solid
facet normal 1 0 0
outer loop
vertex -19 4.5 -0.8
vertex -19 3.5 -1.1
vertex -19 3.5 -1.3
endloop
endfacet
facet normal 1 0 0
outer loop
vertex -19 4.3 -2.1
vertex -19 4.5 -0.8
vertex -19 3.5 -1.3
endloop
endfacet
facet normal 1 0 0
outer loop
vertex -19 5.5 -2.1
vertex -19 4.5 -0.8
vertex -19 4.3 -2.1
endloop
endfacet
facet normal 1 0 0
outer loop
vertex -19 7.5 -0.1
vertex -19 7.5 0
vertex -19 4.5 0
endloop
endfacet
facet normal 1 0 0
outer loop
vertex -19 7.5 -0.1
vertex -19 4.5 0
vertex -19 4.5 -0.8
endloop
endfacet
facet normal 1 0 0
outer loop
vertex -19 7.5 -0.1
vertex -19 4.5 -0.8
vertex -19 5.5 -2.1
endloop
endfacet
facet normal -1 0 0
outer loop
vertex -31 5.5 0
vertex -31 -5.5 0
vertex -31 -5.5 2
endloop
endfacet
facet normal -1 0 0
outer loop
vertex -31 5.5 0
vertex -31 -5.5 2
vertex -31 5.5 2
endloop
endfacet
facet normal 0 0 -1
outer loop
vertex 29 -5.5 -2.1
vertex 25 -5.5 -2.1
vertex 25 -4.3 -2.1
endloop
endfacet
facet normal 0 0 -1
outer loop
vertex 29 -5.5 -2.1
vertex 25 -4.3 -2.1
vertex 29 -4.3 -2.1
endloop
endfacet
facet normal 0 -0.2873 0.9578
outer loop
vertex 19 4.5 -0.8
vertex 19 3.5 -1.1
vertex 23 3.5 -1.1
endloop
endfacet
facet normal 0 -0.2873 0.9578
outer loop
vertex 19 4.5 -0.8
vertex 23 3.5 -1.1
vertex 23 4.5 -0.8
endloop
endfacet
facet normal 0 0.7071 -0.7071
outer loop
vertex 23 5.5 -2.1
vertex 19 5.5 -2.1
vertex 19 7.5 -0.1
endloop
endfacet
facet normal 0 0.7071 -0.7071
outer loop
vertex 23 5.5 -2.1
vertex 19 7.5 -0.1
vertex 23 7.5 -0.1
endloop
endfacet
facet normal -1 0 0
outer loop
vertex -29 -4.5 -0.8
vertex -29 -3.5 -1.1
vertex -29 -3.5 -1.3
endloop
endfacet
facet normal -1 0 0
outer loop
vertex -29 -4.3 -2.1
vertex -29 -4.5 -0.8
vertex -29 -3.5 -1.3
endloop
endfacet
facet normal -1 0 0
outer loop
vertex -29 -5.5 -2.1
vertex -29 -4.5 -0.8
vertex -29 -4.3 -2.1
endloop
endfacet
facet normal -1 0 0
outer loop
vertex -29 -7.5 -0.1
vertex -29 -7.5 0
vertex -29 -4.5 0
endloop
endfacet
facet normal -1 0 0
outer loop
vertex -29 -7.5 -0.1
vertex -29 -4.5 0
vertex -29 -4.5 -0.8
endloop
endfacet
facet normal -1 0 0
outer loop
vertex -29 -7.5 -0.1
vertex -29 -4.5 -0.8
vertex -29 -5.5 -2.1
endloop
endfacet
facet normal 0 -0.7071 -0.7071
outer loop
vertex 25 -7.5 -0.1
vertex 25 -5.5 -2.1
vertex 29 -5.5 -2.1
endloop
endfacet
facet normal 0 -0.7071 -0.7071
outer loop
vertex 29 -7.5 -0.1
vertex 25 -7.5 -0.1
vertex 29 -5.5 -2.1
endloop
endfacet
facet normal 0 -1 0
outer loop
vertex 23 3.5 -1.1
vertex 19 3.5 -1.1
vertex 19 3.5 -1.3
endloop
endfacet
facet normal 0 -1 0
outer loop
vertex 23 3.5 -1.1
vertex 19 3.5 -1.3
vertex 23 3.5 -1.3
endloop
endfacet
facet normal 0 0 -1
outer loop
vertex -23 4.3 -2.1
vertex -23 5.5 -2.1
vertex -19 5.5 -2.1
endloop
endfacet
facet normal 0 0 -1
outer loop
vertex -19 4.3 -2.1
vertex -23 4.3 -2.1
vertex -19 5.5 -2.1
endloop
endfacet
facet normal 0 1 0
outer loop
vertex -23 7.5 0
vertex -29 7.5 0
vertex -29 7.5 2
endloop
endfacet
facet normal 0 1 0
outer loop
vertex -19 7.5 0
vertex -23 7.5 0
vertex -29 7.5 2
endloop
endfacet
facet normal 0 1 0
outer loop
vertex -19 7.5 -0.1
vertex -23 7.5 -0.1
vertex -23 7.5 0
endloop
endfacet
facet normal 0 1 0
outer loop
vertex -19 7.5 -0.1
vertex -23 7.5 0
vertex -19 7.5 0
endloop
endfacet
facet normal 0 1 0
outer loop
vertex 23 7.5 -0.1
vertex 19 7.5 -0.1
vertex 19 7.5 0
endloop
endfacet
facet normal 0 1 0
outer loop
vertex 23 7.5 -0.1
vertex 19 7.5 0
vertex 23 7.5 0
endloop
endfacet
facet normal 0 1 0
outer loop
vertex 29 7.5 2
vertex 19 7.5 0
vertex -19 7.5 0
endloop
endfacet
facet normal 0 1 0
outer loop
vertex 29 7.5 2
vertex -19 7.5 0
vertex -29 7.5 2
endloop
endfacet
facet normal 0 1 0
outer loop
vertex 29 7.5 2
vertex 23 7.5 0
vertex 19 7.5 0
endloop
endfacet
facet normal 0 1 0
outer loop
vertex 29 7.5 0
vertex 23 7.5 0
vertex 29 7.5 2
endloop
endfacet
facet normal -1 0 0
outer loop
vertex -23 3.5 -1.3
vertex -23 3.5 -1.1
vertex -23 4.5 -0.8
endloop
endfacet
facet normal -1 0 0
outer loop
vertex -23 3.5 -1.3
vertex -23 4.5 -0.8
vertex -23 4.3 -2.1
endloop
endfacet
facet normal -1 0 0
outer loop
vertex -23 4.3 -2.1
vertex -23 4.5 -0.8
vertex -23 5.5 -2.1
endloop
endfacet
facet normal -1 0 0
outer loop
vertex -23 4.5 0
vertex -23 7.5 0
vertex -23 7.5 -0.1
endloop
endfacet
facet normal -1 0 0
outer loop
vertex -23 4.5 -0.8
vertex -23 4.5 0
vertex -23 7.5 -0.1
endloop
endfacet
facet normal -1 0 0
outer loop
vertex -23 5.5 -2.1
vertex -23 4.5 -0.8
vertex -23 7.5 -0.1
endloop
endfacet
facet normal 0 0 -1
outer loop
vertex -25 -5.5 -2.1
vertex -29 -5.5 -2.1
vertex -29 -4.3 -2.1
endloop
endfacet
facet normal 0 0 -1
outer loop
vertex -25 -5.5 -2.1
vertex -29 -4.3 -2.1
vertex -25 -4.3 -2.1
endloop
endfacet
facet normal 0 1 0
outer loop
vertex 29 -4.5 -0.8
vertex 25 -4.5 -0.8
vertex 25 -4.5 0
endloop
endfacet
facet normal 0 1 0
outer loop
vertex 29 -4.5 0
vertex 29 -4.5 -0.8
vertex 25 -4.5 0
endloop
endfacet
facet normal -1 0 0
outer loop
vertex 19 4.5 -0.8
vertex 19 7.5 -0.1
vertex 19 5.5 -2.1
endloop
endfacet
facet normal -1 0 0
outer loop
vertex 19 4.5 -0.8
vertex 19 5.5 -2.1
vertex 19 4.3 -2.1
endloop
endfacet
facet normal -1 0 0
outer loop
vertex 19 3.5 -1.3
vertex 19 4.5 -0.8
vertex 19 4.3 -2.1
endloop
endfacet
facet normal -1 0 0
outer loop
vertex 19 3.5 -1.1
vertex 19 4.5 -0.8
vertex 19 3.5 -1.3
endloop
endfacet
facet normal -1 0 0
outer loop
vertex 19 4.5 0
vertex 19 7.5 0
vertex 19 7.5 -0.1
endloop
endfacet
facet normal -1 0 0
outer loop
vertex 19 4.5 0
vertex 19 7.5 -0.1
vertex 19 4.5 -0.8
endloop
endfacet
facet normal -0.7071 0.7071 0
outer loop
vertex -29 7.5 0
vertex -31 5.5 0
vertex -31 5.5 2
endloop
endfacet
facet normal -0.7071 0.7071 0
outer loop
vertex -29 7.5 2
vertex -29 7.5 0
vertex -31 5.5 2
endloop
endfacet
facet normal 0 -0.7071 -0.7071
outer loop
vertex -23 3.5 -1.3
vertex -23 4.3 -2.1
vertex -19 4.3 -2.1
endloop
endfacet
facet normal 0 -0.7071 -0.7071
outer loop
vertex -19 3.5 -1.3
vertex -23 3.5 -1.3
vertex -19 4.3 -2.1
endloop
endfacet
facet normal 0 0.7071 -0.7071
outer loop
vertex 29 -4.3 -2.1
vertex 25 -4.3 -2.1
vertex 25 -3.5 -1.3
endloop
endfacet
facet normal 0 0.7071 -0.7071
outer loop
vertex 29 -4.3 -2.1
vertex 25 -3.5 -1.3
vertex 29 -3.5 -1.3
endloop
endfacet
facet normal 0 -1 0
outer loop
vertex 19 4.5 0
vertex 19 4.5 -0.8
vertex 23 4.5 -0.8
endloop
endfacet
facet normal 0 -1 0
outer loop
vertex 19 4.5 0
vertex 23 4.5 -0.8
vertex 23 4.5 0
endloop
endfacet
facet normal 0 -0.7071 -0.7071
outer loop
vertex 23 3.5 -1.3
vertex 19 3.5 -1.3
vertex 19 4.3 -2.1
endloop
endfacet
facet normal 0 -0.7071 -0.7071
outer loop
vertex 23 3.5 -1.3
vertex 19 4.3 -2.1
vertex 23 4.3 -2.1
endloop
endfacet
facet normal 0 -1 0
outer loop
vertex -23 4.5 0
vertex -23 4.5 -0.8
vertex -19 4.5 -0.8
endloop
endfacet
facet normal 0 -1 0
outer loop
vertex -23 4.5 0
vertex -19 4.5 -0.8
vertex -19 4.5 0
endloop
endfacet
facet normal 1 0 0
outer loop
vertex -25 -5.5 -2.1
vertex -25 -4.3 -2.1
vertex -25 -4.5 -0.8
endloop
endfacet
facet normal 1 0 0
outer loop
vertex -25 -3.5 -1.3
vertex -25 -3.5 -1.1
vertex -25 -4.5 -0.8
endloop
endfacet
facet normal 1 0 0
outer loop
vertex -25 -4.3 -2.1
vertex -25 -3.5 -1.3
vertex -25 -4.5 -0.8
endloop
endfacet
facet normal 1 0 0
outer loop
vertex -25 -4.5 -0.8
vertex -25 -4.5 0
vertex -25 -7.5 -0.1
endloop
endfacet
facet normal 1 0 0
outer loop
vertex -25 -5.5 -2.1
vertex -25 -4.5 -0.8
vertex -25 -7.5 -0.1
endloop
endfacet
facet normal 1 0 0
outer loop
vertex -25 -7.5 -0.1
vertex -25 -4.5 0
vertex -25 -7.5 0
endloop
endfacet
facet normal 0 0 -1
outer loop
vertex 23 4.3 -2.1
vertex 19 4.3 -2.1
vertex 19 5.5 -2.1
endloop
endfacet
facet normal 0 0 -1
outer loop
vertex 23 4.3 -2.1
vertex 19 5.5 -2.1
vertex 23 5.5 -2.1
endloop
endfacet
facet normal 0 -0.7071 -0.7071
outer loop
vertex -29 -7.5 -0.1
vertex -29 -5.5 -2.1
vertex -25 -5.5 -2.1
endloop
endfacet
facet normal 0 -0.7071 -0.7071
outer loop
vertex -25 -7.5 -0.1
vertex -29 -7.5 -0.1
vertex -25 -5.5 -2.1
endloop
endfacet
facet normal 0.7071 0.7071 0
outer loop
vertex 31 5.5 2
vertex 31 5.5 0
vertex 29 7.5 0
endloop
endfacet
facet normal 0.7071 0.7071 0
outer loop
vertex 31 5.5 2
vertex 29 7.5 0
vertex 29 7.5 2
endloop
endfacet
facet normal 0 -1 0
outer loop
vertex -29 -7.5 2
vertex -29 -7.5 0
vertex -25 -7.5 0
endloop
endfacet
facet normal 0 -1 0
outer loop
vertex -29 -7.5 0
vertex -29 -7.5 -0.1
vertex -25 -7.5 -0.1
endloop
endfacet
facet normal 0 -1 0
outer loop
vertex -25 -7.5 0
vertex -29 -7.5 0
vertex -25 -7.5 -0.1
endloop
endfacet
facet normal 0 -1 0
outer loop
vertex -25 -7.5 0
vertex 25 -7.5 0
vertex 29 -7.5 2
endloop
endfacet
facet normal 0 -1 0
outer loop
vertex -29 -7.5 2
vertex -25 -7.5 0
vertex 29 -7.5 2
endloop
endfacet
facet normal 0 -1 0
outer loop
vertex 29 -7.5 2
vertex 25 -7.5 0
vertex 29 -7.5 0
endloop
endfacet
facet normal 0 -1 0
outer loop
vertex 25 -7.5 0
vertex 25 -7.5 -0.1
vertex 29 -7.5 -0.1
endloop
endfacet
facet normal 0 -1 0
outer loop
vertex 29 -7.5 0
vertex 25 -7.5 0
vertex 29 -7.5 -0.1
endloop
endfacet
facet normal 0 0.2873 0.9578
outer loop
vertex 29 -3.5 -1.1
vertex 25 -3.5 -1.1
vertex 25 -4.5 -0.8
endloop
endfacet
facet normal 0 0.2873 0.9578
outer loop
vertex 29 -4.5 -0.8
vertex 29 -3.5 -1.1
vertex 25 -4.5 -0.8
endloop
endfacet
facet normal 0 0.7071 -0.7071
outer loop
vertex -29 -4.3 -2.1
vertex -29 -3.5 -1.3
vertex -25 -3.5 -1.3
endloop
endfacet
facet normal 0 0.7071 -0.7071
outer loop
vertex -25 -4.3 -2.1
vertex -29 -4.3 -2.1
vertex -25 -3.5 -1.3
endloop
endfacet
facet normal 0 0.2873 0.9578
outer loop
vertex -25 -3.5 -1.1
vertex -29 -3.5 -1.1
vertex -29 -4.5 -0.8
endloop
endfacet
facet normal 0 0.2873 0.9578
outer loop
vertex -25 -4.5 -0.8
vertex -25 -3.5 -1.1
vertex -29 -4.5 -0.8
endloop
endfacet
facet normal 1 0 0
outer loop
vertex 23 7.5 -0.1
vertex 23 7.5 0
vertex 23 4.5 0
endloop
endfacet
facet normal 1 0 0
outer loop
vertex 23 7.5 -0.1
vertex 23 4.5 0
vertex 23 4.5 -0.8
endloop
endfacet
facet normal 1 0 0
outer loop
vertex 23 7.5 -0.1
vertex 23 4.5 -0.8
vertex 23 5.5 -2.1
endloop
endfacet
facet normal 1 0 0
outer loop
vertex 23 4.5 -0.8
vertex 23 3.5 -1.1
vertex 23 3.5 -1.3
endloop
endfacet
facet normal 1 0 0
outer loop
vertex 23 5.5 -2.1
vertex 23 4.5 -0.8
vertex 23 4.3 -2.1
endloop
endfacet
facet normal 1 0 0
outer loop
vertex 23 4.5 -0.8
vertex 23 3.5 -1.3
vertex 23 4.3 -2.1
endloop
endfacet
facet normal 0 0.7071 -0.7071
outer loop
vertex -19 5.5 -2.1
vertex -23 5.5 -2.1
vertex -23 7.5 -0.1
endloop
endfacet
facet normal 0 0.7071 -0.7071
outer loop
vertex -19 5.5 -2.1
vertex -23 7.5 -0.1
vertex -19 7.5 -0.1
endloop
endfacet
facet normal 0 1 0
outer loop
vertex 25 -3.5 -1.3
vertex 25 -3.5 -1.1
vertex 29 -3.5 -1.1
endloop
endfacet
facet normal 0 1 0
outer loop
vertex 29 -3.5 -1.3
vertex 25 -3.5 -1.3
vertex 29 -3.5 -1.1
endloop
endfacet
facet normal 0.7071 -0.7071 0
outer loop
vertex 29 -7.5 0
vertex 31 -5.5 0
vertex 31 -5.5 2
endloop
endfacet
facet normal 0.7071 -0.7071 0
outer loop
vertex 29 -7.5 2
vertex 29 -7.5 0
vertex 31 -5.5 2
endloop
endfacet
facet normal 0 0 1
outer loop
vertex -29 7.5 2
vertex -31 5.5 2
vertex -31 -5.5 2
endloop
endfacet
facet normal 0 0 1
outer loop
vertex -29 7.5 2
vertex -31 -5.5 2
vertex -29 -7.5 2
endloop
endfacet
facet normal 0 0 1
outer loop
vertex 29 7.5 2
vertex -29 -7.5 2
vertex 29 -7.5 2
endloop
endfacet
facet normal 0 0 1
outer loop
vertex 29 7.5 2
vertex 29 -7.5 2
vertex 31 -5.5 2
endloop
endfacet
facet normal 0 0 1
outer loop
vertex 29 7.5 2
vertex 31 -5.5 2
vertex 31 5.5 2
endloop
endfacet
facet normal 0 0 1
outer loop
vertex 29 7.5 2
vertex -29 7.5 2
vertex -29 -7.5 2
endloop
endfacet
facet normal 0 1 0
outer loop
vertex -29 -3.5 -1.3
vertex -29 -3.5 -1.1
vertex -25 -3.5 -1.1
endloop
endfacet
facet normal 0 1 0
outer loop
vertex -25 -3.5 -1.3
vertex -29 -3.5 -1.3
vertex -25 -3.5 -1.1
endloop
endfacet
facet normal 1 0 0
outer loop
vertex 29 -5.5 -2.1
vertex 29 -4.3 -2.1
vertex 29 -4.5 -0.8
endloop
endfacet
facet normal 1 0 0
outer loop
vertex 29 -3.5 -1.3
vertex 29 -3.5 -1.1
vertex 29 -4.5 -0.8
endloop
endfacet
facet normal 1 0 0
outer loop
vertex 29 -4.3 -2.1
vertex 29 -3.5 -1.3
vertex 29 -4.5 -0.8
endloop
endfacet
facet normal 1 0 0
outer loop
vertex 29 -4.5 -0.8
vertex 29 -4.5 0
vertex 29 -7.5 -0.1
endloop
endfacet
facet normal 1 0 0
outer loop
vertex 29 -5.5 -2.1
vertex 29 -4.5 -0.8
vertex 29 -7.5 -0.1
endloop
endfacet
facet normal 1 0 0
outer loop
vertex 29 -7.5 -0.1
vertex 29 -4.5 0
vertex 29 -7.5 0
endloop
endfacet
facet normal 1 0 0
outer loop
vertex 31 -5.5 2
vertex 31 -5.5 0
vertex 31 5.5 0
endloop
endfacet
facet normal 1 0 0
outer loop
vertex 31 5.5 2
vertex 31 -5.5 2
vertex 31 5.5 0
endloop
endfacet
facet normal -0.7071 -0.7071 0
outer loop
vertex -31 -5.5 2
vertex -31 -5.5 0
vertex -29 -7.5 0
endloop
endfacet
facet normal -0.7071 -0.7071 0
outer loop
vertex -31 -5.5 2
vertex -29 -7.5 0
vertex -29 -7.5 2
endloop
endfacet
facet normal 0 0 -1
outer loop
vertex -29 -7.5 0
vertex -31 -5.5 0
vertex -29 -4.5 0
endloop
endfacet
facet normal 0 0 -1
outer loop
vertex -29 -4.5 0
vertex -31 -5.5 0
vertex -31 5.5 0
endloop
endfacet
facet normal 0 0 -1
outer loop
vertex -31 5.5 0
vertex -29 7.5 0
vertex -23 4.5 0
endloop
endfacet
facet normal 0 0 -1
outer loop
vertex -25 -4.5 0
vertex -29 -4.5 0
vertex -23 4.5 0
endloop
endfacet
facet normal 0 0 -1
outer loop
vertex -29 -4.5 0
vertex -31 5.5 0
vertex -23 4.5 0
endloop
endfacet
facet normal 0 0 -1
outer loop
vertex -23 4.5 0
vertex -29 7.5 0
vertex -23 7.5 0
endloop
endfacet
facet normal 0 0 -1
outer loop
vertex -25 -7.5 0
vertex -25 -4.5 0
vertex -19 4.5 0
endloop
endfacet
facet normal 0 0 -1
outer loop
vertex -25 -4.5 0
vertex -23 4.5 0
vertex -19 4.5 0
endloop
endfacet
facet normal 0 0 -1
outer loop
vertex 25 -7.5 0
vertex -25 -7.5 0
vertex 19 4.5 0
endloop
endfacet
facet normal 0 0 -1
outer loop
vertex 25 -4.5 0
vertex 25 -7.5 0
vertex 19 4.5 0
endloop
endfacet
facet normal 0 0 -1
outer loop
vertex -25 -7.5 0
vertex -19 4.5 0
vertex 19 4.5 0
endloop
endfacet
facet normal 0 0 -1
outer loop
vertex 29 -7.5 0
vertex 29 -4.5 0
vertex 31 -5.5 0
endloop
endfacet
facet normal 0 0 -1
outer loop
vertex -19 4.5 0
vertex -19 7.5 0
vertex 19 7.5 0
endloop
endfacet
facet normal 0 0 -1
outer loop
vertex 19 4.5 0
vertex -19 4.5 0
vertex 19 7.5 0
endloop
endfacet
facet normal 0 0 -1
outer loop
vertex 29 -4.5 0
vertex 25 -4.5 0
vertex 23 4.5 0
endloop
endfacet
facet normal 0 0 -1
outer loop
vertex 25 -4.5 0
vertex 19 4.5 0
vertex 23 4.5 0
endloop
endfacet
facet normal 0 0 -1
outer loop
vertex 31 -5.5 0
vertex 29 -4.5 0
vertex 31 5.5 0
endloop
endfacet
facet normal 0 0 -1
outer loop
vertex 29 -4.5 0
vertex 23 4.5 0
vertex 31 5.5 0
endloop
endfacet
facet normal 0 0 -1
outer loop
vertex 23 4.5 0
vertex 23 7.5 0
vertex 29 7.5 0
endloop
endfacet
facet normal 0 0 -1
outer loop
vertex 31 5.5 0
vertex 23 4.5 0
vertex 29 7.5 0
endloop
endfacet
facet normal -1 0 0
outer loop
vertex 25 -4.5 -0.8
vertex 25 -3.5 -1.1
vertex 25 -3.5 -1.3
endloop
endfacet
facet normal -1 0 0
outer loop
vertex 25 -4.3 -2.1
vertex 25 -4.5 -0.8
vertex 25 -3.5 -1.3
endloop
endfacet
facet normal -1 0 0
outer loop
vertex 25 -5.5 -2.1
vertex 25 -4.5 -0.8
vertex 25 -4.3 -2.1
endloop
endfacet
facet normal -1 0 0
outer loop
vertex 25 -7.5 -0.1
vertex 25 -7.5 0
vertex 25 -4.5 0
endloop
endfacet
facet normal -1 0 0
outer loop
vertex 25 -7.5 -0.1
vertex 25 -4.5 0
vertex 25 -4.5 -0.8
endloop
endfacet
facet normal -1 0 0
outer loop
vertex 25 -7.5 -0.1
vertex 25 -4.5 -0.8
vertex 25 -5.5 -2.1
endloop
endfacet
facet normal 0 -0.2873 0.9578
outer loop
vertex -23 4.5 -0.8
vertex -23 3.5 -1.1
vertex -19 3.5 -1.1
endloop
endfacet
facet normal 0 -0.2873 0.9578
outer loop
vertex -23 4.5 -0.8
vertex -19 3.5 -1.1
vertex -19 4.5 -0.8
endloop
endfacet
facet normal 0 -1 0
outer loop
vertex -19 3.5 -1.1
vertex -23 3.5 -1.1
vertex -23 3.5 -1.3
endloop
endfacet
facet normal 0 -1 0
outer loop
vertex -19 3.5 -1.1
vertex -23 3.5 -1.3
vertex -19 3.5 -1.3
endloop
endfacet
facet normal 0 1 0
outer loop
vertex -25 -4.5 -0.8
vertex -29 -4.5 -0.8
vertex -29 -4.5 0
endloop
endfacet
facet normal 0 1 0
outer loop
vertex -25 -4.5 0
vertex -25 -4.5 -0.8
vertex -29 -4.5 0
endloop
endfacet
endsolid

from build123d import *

# Parameters (mm, degrees)
F0_W     = 62
F0_H     = 15
F1_DEPTH = 2
F2_W     = 4
F2_H     = 3
F3_DEPTH = 2.1
F4_SIZE  = 2
F5_DEPTH = 1
F7_DEPTH = 70
F10_SIZE = 0.8


with BuildPart() as f1:
    # F0 (on Top) → F1 (new body)
    with BuildSketch(Plane.XY):
        Rectangle(F0_W, F0_H)
    extrude(amount=F1_DEPTH)

    # F2 (on face) → F3 (join)
    with BuildSketch(Plane(origin=(0, 0, 0), x_dir=(1, 0, 0), z_dir=(0, 0, -1))):
        with Locations((-27, 6)):
            Rectangle(F2_W, F2_H)
        with Locations((-21, -6)):
            Rectangle(F2_W, F2_H)
        with Locations((21, -6)):
            Rectangle(F2_W, F2_H)
        with Locations((27, 6)):
            Rectangle(F2_W, F2_H)
    extrude(amount=F3_DEPTH)

    # F4
    f4_edges = [f1.edges().sort_by_distance(p)[0] for p in [
        (-31, -7.5, 1),
        (-31, 7.5, 1),
        (-21, 7.5, -2.1),
        (-27, -7.5, -2.1),
        (31, -7.5, 1),
        (27, -7.5, -2.1),
        (31, 7.5, 1),
        (21, 7.5, -2.1),
    ]]
    chamfer(f4_edges, length=F4_SIZE)

    # F5 (add, symmetric): faces of the model
    f5_faces = [f1.faces().sort_by_distance(p)[0] for p in [
        (-27, -4.5, -1.05),
        (27, -4.5, -1.05),
        (21, 4.5, -1.05),
        (-21, 4.5, -1.05),
    ]]
    extrude(f5_faces, amount=F5_DEPTH, both=True, dir=(0, 1, 0))


with BuildPart() as f7:
    # F6 (on face) → F7 (new body)
    with BuildSketch(Plane(origin=(-29, 0, 0), x_dir=(0, -1, 0), z_dir=(-1, 0, 0))):
        Polygon((4.5, 0), (3.5, 0), (3.5, -1.1), (4.5, -0.8), align=None)
    extrude(amount=-F7_DEPTH)


with BuildPart() as f8_1:
    # F8: instance of F7
    add(f7.part.mirror(Plane.XZ))


with BuildPart() as f1_1:
    add(f1.part)

    # F9: cut F7, F8_1
    add(f7.part, mode=Mode.SUBTRACT)
    add(f8_1.part, mode=Mode.SUBTRACT)

    # F10
    f10_edges = [f1_1.edges().sort_by_distance(p)[0] for p in [
        (-27, -3.5, -2.1),
        (27, -3.5, -2.1),
        (21, 3.5, -2.1),
        (-21, 3.5, -2.1),
    ]]
    chamfer(f10_edges, length=F10_SIZE)


solid = f1_1.part
